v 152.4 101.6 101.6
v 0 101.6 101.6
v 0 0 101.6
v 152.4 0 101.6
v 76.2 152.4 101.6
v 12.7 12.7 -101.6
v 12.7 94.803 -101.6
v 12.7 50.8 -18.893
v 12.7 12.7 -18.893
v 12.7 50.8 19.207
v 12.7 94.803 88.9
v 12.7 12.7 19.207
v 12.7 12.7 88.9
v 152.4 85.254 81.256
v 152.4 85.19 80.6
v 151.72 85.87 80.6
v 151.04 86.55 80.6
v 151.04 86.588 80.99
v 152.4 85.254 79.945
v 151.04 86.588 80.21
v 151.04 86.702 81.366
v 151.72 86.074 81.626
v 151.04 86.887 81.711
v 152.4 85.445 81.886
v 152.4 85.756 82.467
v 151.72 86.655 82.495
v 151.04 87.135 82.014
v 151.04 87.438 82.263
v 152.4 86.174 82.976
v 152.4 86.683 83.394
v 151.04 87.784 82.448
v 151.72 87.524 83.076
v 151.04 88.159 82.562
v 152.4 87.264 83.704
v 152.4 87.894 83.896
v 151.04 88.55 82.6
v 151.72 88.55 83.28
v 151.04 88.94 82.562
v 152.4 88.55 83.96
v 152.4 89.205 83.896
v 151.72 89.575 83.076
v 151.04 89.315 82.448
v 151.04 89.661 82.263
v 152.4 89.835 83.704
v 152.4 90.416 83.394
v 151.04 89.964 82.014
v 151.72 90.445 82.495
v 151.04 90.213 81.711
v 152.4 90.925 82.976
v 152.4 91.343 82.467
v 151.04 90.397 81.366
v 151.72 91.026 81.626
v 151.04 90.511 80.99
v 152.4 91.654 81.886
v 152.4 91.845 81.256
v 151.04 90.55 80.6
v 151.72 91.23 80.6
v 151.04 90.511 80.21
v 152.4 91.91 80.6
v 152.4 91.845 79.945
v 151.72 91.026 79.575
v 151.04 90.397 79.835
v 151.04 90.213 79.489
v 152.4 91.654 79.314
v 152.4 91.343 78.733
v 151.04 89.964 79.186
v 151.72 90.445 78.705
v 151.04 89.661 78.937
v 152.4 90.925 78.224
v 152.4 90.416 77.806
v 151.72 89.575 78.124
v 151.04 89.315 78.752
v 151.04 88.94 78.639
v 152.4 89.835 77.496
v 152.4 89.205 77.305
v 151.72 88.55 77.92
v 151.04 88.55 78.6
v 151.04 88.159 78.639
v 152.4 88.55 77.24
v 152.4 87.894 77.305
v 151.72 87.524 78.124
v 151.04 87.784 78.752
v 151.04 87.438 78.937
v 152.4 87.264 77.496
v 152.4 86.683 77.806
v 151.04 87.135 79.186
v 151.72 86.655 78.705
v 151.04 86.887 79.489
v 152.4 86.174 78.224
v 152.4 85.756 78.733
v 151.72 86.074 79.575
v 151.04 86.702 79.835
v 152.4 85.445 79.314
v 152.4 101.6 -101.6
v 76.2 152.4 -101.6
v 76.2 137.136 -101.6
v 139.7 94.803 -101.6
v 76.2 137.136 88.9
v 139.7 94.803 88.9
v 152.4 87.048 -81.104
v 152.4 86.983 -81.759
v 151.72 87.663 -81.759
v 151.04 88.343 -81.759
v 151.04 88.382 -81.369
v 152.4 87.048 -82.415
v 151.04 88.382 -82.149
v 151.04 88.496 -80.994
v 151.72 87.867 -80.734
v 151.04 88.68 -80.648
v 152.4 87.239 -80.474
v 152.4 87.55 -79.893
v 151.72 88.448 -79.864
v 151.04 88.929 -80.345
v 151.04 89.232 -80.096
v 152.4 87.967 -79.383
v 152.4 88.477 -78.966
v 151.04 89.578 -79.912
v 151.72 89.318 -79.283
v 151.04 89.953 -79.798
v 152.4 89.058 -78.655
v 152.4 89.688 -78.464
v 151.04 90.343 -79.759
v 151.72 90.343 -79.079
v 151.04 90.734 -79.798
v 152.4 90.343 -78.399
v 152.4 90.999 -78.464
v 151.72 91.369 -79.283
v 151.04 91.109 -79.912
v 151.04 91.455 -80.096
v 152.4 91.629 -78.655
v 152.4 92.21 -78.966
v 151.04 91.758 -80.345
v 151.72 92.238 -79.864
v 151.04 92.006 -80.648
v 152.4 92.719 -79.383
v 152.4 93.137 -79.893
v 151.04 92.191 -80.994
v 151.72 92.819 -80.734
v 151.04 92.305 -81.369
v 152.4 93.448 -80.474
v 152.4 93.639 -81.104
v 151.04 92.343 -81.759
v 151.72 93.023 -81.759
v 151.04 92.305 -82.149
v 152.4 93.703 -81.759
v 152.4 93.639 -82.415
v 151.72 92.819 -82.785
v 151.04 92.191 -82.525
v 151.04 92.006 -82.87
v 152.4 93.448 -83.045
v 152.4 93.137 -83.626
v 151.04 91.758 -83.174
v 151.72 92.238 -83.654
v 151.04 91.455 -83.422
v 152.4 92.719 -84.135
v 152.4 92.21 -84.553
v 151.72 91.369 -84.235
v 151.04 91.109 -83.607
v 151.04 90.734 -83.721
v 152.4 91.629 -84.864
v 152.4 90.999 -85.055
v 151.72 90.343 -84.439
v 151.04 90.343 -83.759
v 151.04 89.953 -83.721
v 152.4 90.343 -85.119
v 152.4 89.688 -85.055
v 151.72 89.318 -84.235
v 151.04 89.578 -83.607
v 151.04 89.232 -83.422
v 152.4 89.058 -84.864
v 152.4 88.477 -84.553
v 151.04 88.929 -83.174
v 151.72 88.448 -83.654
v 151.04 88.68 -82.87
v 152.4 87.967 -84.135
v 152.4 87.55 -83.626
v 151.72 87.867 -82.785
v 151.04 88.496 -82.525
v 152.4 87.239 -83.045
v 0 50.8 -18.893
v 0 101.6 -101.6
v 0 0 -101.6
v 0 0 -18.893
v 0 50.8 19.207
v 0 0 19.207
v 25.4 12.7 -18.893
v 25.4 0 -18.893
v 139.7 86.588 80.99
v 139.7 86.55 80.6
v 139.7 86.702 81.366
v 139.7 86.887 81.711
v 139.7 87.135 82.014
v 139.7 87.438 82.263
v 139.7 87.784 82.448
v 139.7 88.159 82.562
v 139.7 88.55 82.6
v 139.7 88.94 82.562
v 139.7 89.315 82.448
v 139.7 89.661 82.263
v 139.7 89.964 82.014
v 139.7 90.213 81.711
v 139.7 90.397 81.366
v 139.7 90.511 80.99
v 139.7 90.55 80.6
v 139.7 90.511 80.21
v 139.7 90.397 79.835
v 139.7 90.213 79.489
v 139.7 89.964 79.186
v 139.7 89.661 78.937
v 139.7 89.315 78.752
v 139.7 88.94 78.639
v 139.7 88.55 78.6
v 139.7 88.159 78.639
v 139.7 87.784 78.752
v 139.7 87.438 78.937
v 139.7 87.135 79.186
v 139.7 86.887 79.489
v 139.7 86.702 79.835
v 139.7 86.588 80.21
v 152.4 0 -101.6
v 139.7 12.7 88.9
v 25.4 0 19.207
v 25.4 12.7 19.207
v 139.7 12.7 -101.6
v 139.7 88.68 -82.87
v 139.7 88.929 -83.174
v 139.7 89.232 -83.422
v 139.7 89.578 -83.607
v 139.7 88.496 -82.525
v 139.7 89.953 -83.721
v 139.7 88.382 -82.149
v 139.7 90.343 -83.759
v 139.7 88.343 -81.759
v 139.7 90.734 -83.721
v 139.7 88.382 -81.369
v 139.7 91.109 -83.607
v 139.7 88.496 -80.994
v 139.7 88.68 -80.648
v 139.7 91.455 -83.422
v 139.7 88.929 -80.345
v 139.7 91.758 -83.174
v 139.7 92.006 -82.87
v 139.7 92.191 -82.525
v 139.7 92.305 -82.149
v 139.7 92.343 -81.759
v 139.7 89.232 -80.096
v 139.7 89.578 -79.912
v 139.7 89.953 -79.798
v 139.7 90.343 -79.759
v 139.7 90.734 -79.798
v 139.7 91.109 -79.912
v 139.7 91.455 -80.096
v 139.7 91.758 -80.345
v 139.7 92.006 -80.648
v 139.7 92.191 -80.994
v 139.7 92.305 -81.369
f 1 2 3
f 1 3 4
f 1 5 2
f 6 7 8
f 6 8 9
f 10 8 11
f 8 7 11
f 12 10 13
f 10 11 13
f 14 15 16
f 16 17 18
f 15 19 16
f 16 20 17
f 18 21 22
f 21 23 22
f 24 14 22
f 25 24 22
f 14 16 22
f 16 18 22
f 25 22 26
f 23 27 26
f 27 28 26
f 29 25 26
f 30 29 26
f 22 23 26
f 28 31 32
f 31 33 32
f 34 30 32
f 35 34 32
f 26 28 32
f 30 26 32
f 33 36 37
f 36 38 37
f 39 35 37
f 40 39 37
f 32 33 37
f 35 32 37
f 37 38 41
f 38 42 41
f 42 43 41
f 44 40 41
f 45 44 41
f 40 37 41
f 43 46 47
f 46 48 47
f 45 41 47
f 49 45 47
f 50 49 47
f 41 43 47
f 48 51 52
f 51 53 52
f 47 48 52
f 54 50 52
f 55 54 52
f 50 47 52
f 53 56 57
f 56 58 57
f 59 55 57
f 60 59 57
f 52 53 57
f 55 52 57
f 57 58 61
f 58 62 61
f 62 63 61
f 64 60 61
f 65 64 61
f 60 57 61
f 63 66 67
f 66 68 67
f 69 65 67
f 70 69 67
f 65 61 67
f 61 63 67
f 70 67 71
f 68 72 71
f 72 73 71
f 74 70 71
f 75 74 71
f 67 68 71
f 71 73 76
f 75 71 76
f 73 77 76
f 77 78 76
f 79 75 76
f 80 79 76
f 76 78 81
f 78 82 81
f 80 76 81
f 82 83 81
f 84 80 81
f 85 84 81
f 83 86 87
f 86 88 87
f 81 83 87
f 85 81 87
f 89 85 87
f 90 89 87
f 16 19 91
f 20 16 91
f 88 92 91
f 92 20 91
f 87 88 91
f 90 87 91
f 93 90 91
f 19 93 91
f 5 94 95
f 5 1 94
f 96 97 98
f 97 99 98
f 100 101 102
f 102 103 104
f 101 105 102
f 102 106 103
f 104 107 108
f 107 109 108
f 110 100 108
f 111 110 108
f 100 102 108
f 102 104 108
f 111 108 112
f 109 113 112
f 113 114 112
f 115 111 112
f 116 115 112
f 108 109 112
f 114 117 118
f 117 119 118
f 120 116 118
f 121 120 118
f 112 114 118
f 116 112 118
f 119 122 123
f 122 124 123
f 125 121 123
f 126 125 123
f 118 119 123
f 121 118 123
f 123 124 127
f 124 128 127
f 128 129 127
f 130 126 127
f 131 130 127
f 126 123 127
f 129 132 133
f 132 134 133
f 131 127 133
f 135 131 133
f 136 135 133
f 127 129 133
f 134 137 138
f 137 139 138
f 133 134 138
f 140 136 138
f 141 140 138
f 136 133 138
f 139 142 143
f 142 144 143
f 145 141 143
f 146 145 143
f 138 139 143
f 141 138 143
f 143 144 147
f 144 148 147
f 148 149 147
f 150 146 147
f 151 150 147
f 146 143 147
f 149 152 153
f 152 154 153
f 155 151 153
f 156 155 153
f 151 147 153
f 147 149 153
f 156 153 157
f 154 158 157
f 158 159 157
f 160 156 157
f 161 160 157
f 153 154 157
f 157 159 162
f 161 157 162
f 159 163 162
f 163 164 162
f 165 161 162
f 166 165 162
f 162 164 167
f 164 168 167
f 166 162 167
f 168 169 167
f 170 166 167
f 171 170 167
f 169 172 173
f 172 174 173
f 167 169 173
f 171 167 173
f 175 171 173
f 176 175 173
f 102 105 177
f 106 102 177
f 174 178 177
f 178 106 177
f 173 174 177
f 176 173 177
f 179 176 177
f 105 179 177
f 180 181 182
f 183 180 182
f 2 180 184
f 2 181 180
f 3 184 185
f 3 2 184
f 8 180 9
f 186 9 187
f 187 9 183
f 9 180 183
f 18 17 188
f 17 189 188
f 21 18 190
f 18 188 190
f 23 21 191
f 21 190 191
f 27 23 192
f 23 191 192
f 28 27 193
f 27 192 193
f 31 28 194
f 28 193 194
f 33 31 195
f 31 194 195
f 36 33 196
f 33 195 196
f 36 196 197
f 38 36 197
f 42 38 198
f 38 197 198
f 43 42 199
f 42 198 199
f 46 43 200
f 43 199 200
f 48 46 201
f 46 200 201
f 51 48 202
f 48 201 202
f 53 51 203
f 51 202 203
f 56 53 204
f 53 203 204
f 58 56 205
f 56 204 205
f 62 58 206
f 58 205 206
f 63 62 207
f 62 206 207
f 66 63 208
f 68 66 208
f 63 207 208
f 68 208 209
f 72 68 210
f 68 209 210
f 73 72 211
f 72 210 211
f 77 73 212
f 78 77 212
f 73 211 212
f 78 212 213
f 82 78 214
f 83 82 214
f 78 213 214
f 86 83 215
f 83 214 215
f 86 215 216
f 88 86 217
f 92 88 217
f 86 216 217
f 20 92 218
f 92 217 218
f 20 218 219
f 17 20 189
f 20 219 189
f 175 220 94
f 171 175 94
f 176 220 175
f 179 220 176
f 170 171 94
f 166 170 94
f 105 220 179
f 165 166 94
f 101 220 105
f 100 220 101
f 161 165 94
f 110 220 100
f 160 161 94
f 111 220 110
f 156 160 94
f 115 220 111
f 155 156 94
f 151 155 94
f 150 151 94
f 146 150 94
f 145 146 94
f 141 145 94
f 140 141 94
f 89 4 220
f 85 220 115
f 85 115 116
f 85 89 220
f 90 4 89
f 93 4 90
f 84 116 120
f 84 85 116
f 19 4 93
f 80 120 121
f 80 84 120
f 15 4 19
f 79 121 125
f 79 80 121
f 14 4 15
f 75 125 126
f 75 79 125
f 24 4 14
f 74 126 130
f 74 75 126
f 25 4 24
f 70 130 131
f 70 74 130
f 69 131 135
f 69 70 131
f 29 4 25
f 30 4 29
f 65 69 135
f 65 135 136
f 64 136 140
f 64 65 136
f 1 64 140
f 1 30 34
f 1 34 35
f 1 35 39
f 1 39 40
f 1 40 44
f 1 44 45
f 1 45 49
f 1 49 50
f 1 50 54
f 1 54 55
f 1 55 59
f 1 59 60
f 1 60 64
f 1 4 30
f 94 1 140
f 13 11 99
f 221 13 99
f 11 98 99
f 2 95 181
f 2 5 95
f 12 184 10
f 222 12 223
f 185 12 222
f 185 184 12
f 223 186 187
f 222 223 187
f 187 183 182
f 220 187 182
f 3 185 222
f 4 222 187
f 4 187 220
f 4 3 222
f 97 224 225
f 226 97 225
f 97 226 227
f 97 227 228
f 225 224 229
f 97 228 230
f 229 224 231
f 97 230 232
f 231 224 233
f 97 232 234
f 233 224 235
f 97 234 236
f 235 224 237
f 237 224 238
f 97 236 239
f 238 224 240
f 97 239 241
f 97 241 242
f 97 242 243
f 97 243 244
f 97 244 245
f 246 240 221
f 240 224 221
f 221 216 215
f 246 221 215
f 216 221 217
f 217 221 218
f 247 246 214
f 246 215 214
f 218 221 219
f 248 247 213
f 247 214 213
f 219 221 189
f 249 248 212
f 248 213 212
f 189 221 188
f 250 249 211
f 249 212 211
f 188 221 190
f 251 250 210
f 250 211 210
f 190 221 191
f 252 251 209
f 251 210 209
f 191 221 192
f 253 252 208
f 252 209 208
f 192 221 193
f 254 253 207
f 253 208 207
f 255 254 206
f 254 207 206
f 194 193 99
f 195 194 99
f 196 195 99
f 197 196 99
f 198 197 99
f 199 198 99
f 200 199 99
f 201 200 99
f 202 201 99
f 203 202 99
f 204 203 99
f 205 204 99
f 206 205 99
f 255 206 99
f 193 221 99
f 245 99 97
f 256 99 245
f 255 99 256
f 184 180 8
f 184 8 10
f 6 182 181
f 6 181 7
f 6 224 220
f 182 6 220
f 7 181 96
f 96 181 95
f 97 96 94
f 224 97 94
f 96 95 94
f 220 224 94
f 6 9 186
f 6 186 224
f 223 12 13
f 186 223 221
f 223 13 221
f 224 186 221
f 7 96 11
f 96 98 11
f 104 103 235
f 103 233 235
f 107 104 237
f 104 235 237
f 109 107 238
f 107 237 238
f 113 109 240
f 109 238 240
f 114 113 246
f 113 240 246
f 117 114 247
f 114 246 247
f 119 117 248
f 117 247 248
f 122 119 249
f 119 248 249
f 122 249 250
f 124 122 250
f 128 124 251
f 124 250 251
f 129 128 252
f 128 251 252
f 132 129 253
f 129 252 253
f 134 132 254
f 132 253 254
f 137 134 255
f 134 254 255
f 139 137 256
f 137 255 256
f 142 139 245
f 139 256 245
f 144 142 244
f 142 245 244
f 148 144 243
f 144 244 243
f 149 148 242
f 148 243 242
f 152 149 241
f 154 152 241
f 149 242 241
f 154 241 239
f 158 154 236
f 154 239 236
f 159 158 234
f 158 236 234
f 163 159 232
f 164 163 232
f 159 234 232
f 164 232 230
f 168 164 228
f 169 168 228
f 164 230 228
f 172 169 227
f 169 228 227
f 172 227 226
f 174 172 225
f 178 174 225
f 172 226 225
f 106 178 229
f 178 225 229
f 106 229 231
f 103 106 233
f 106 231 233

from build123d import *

# Parameters (mm, degrees)
F1_DEPTH       = 101.6
F3_T           = -12.7
F2_W           = 50.8
F2_H           = 38.1
F4_DEPTH       = 25.4
F7_D           = 4
F7_DEPTH       = 14.2
F7_CSINK_D     = 6.72
F7_CSINK_ANGLE = 90
F7_TIP         = 1.2017212381


with BuildPart() as f1:
    # F0 (on Top) → F1 (new body, symmetric)
    with BuildSketch(Plane.XY):
        Polygon((0, 101.6), (0, 0), (152.4, 0), (152.4, 101.6), (76.2, 152.4), align=None)
    extrude(amount=F1_DEPTH, both=True)

    # F3
    f3_openings = [f1.faces().sort_by_distance(p)[0] for p in [
        (76.2, 64.346667, -101.6),
    ]]
    offset(amount=F3_T, openings=f3_openings)

    # F2 (on face) → F4 (cut)
    with BuildSketch(Plane(origin=(0, 0, 0), x_dir=(0, -1, 0), z_dir=(-1, 0, 0))):
        with Locations((-25.4, 0.1572931677)):
            Rectangle(F2_W, F2_H)
    extrude(amount=-F4_DEPTH, mode=Mode.SUBTRACT)

    # F7
    with Locations(Plane.YZ.offset(152.4)):
        with Locations((88.5495916009, 80.6001722813), (90.3433784842, -81.7593187094)):
            CounterSinkHole(F7_D / 2, F7_CSINK_D / 2, depth=F7_DEPTH, counter_sink_angle=F7_CSINK_ANGLE)
            with Locations((0, 0, -(F7_DEPTH + F7_TIP / 2))):  # 118° drill point
                Cone(0, F7_D / 2, F7_TIP, mode=Mode.SUBTRACT)


solid = f1.part
